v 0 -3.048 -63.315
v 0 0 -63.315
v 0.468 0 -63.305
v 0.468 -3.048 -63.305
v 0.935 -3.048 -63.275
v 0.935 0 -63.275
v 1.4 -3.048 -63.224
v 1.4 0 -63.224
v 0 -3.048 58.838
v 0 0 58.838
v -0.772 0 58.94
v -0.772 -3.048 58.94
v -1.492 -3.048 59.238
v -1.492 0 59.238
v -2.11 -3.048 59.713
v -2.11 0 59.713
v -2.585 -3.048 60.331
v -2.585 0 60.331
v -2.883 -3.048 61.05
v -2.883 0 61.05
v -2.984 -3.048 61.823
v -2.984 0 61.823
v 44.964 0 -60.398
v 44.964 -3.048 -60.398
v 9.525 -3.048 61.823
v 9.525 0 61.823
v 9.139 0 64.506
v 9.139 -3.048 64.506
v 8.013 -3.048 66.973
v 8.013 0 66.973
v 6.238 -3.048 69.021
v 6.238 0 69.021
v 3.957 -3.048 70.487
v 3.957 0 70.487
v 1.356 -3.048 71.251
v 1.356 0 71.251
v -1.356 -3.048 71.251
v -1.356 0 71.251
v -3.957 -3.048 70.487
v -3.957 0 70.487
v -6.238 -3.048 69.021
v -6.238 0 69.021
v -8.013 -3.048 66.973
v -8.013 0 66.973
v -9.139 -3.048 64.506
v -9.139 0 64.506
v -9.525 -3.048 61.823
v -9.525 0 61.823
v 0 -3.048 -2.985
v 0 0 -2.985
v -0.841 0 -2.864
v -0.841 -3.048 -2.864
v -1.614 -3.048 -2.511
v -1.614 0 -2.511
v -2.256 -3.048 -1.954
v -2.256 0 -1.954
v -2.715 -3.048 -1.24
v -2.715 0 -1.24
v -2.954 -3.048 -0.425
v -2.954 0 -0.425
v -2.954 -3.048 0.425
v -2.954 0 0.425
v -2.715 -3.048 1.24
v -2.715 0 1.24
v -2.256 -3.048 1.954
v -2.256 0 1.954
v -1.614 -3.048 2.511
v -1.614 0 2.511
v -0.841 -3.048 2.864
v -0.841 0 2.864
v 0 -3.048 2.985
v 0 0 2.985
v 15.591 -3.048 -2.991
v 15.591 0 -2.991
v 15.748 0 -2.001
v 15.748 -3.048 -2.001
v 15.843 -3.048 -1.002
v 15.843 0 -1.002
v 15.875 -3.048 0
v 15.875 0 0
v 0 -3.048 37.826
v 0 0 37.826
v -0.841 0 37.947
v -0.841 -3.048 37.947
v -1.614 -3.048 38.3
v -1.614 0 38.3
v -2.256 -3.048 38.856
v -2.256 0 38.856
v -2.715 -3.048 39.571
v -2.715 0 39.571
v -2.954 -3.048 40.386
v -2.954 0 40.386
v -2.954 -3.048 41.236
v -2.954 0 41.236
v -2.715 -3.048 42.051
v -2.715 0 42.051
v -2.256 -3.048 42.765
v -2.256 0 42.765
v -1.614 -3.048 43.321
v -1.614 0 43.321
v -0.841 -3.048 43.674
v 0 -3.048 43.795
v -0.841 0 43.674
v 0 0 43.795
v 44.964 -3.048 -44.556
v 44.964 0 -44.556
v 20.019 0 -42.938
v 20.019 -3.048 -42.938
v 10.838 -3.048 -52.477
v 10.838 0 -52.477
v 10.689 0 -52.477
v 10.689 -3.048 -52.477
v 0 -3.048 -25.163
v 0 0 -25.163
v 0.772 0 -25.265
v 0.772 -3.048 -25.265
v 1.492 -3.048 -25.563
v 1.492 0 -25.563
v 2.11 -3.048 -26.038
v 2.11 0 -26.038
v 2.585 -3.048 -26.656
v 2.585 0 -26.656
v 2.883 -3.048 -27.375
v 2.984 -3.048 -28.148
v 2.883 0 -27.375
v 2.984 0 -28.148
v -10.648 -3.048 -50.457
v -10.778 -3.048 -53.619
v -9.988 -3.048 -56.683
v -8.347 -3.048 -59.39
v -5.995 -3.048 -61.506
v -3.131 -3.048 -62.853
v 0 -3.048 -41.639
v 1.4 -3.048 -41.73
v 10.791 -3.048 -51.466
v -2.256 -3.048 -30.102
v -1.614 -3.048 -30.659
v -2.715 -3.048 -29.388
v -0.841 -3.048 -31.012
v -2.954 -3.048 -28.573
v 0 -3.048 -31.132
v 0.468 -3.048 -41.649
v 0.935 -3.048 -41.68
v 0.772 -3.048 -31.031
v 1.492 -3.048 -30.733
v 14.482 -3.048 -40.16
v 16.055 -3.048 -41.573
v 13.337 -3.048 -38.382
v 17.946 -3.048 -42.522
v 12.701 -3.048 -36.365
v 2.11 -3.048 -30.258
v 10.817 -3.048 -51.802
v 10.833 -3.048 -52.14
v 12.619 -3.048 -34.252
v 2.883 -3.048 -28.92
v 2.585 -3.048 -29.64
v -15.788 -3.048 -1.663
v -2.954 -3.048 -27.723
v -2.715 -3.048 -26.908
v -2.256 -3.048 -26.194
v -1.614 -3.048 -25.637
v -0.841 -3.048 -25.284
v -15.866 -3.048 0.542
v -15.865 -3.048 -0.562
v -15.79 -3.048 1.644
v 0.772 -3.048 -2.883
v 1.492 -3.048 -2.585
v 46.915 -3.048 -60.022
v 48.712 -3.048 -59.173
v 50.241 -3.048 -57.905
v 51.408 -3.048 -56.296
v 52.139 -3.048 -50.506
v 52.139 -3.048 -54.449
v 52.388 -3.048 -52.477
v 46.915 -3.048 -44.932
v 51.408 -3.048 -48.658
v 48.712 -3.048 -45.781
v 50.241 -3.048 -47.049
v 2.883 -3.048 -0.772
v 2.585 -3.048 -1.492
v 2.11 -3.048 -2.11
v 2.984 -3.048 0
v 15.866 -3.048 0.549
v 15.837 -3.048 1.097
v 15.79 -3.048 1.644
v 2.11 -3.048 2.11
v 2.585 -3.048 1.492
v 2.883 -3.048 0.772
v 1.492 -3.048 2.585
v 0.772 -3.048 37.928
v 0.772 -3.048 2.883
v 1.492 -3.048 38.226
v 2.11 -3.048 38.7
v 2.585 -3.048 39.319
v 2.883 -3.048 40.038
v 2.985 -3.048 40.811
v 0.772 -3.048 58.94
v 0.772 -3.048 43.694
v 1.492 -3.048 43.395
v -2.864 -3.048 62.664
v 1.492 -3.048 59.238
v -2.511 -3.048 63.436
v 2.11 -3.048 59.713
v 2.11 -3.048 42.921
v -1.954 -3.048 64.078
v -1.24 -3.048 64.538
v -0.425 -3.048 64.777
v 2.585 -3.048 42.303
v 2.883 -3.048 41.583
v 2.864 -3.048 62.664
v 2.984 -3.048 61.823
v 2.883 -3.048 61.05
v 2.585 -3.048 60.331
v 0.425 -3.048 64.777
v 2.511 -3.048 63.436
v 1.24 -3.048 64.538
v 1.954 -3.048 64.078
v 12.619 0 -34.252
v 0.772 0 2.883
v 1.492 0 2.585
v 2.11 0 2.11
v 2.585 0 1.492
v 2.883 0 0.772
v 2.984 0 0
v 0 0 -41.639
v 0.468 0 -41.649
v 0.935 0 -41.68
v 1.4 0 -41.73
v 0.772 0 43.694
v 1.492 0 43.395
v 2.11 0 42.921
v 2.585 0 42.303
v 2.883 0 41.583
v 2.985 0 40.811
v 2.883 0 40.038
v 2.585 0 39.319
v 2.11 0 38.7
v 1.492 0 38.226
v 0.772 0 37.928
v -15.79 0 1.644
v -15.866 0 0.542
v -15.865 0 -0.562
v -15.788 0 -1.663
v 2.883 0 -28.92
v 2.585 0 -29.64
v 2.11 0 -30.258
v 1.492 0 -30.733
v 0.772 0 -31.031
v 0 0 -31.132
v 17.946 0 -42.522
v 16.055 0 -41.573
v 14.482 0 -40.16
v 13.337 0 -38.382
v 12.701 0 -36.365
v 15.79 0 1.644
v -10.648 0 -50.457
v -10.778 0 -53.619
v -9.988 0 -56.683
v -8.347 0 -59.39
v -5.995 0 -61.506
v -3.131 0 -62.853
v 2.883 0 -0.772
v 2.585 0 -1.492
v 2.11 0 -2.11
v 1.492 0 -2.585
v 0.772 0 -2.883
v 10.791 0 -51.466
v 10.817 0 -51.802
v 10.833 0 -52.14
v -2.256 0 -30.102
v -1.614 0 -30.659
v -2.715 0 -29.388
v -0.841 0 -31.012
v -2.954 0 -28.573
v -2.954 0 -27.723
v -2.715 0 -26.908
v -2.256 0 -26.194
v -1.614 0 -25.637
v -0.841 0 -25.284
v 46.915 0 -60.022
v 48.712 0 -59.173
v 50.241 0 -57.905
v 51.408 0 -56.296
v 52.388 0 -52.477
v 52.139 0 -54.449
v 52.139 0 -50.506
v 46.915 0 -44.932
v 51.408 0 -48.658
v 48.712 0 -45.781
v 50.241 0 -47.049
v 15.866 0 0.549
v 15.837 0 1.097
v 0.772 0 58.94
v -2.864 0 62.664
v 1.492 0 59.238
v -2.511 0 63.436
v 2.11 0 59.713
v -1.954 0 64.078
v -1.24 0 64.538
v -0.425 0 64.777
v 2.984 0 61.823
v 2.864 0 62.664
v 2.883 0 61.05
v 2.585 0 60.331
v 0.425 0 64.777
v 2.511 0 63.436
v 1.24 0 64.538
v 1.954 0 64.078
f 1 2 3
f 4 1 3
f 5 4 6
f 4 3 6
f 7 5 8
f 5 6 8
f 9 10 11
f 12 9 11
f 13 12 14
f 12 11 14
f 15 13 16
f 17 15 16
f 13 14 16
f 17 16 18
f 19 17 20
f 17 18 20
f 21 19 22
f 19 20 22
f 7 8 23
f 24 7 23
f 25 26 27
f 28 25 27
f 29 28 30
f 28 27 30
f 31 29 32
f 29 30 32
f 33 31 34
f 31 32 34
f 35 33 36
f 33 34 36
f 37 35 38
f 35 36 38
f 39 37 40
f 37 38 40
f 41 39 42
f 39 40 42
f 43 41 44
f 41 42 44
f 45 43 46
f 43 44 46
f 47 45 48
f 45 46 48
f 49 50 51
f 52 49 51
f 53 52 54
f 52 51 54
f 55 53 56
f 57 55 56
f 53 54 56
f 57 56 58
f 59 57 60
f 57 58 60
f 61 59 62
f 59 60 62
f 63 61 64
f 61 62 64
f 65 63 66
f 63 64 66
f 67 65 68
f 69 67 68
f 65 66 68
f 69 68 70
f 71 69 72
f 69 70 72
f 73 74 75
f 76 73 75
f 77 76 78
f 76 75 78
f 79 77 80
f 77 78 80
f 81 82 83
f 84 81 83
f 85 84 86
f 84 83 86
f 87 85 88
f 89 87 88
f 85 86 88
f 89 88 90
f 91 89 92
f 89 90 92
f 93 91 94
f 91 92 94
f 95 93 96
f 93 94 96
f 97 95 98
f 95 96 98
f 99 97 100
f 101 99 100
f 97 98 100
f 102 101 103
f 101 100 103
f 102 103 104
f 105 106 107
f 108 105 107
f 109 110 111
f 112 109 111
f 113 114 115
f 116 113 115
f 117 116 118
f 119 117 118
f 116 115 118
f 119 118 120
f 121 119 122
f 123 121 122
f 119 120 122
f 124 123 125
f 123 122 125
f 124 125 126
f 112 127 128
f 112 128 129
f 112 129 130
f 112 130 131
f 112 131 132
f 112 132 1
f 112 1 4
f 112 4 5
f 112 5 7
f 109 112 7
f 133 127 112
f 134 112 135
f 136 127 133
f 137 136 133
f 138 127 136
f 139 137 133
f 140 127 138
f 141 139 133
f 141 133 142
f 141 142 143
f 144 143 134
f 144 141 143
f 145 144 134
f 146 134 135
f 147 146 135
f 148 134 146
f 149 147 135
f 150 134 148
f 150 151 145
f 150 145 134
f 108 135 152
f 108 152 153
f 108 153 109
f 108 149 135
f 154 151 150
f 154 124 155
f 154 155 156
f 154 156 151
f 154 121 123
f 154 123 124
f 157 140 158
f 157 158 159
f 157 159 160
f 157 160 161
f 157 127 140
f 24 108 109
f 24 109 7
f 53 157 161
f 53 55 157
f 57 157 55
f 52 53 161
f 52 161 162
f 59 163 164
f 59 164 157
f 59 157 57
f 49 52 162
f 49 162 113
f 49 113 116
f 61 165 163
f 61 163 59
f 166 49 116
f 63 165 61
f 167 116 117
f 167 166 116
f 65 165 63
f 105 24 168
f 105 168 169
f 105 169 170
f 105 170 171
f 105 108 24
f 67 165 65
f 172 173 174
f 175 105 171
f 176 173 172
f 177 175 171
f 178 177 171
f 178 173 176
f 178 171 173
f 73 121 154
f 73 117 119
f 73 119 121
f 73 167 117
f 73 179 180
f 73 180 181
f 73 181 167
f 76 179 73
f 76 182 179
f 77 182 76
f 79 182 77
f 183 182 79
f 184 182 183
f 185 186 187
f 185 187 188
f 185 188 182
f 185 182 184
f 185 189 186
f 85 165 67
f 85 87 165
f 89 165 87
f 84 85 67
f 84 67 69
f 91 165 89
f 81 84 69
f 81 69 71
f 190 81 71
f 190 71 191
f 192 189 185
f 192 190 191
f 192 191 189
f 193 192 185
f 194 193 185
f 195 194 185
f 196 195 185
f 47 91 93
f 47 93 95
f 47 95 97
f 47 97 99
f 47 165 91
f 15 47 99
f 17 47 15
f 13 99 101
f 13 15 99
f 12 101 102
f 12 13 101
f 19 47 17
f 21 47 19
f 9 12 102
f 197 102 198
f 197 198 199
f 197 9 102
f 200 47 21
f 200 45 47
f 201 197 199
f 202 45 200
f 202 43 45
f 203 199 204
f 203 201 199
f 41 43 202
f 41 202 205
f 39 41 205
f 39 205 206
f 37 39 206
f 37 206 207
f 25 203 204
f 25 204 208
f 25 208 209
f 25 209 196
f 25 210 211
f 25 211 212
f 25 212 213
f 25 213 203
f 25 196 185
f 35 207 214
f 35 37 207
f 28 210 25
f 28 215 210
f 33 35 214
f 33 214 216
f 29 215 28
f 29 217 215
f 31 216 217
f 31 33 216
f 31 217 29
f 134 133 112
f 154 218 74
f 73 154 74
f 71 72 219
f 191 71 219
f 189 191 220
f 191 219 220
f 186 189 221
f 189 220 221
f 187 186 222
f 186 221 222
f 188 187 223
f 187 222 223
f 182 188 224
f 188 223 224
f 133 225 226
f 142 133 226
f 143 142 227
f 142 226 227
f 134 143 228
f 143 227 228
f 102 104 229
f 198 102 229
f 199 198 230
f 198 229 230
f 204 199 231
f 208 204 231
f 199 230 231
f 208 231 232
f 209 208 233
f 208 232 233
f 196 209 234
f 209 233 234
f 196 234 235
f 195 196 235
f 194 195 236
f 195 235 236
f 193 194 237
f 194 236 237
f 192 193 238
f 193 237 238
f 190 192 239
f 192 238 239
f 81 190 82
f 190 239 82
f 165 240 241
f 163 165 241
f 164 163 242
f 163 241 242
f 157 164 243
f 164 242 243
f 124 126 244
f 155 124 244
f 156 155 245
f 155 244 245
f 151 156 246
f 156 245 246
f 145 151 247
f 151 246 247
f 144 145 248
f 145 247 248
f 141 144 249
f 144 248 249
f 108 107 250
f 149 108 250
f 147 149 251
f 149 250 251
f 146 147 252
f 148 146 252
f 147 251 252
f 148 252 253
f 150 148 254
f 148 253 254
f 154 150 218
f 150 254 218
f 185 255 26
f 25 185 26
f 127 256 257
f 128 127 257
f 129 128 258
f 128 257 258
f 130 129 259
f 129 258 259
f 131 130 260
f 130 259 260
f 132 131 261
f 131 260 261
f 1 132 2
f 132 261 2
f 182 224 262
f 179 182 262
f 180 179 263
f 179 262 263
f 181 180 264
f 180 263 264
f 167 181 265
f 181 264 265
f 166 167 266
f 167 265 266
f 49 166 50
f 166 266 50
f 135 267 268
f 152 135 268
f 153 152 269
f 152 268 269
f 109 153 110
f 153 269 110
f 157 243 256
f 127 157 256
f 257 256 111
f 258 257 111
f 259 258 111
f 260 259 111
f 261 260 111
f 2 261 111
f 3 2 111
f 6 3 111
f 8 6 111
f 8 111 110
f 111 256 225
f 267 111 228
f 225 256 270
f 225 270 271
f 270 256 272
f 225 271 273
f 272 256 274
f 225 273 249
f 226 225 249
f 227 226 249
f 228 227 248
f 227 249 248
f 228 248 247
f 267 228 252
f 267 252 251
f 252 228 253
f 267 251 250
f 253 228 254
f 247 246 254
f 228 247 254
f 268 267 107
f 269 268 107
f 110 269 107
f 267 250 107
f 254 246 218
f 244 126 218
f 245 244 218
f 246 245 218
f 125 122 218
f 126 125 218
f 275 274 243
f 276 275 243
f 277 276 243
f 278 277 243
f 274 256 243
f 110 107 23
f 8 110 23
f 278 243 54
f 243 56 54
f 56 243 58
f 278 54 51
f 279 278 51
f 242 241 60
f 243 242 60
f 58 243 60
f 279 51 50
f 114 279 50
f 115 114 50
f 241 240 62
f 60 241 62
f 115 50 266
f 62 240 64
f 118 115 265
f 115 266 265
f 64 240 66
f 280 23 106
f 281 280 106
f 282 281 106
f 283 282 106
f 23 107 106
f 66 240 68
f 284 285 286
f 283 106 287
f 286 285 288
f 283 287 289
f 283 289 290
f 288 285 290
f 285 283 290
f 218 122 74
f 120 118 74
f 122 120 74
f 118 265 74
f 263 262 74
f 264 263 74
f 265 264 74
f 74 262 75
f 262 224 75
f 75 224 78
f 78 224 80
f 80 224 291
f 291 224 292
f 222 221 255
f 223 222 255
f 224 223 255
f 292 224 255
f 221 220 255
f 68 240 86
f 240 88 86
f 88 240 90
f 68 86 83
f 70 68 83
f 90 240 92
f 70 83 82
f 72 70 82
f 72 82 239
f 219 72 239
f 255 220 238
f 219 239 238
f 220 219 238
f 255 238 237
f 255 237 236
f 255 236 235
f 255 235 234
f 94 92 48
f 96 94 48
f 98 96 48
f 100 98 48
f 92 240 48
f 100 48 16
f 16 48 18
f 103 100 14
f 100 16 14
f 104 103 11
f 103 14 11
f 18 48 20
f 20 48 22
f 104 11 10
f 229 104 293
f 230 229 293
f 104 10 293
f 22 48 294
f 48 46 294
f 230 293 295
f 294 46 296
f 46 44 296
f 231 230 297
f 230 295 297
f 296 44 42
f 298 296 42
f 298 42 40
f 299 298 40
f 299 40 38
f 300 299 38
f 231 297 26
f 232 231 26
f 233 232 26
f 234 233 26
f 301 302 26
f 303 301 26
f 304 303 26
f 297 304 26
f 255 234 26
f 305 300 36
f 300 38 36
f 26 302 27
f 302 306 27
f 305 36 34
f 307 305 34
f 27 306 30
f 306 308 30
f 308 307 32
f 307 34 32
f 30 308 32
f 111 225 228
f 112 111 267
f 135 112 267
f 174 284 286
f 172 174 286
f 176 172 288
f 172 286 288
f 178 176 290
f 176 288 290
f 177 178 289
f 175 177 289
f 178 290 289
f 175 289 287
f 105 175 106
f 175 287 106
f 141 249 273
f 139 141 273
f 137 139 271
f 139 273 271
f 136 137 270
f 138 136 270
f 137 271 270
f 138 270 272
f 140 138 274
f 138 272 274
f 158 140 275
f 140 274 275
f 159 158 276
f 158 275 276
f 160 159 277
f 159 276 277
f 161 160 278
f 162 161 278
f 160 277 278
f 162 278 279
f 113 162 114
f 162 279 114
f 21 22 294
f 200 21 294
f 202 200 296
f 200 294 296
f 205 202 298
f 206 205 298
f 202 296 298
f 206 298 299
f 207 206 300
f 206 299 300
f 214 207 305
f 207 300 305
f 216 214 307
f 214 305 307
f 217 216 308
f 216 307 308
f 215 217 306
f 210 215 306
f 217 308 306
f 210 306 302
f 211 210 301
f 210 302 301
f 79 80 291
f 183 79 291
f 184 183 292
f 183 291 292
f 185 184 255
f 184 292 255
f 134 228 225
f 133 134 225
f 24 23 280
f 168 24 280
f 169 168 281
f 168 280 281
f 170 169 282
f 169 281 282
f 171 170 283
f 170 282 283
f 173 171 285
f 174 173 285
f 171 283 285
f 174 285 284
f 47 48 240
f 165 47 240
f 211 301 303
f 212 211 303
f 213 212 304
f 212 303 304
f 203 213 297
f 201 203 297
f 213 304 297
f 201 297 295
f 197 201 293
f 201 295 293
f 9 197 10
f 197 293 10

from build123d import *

# Parameters (mm, degrees)
F1_DEPTH = 3.048


with BuildPart() as f1:
    # F0 (on Front) → F1 (new body)
    with BuildSketch(Plane.XZ):
        with BuildLine():
            Line((15.875, 0), (15.5906901587, -2.9909873578))
            ThreePointArc((15.5906901587, -2.9909873578), (15.803762705, -1.5022347903), (15.875, 0))
        make_face()
        with BuildLine():
            Line((1.4003408265, -63.2241331384), (0, -63.3149812557))
            ThreePointArc((0, -63.3149812557), (0.7016423253, -63.2922453786), (1.4003408265, -63.2241331384))
        make_face()
        with BuildLine():
            ThreePointArc((36.5125, -52.4770691991), (39.0220603724, -58.2685610319), (44.9638707463, -60.3979178346))
            ThreePointArc((44.9638707463, -60.3979178346), (50.2414918328, -57.9050088266), (52.3875, -52.4770691991))
            ThreePointArc((52.3875, -52.4770691991), (50.2414918328, -47.0491295715), (44.9638707463, -44.5562205636))
            ThreePointArc((44.9638707463, -44.5562205636), (39.0220603724, -46.6855773663), (36.5125, -52.4770691991))
        make_face()
        with BuildLine():
            Line((12.6191526396, -34.2520619409), (11.8439294246, -42.4075405738))
            Line((11.8439294246, -42.4075405738), (20.0189840628, -42.9379031172))
            ThreePointArc((20.0189840628, -42.9379031172), (14.4819098788, -40.1601346792), (12.6191526396, -34.2520619409))
        make_face()
        with BuildLine():
            ThreePointArc((9.525, 61.8229308009), (0, 71.3479308009), (-9.525, 61.8229308009))
            Line((-9.525, 61.8229308009), (-2.9845, 61.8229308009))
            ThreePointArc((-2.9845, 61.8229308009), (0, 64.8074308009), (2.9845, 61.8229308009))
            ThreePointArc((2.9845, 61.8229308009), (2.1103601885, 59.7125706125), (0, 58.8384308009))
            Line((0, 58.8384308009), (0, 52.2979308009))
            ThreePointArc((0, 52.2979308009), (6.7351920908, 55.0877387101), (9.525, 61.8229308009))
        make_face()
        with BuildLine():
            Line((-2.9845, 61.8229308009), (-9.525, 61.8229308009))
            ThreePointArc((-9.525, 61.8229308009), (-6.7351920908, 55.0877387101), (0, 52.2979308009))
            Line((0, 52.2979308009), (0, 58.8384308009))
            ThreePointArc((0, 58.8384308009), (-2.1103601885, 59.7125706125), (-2.9845, 61.8229308009))
        make_face()
        with BuildLine():
            Line((0, 37.8262675612), (0, 15.875))
            ThreePointArc((0, 15.875), (10.6283048728, 11.7921482577), (15.7896751859, 1.6437099882))
            Line((15.7896751859, 1.6437099882), (9.525, 61.8229308009))
            ThreePointArc((9.525, 61.8229308009), (6.7351920908, 55.0877387101), (0, 52.2979308009))
            Line((0, 52.2979308009), (0, 43.7952675612))
            ThreePointArc((0, 43.7952675612), (2.1103601885, 42.9211277496), (2.9845, 40.8107675612))
            ThreePointArc((2.9845, 40.8107675612), (2.1103601885, 38.7004073727), (0, 37.8262675612))
        make_face()
        with BuildLine():
            Line((-9.525, 61.8229308009), (-15.7896751859, 1.6437099882))
            ThreePointArc((-15.7896751859, 1.6437099882), (-10.6283048728, 11.7921482577), (0, 15.875))
            Line((0, 15.875), (0, 37.8262675612))
            ThreePointArc((0, 37.8262675612), (-2.9845, 40.8107675612), (0, 43.7952675612))
            Line((0, 43.7952675612), (0, 52.2979308009))
            ThreePointArc((0, 52.2979308009), (-6.7351920908, 55.0877387101), (-9.525, 61.8229308009))
        make_face()
        with BuildLine():
            ThreePointArc((-15.7896751859, 1.6437099882), (-15.8749970359, -0.0097010433), (-15.7876544862, -1.6630065613))
            ThreePointArc((-15.7876544862, -1.6630065613), (-10.6210968322, -11.7986408997), (0, -15.875))
            Line((0, -15.875), (0, -2.9845))
            ThreePointArc((0, -2.9845), (-2.9845, 0), (0, 2.9845))
            Line((0, 2.9845), (0, 11.0229308009))
            Line((0, 11.0229308009), (0, 15.875))
            ThreePointArc((0, 15.875), (-10.6283048728, 11.7921482577), (-15.7896751859, 1.6437099882))
        make_face()
        with BuildLine():
            Line((0, -31.1324340047), (0, -41.6391571425))
            ThreePointArc((0, -41.6391571425), (0.7016423253, -41.6618930196), (1.4003408265, -41.7300052598))
            Line((1.4003408265, -41.7300052598), (11.8439294246, -42.4075405738))
            Line((11.8439294246, -42.4075405738), (12.6191526396, -34.2520619409))
            Line((12.6191526396, -34.2520619409), (15.5906901587, -2.9909873578))
            ThreePointArc((15.5906901587, -2.9909873578), (10.1127073698, -12.2371881841), (0, -15.875))
            Line((0, -15.875), (0, -25.1634340047))
            ThreePointArc((0, -25.1634340047), (2.1103601885, -26.0375738162), (2.9845, -28.1479340047))
            ThreePointArc((2.9845, -28.1479340047), (2.1103601885, -30.2582941931), (0, -31.1324340047))
        make_face()
        with BuildLine():
            Line((10.8867652033, -52.4770691991), (10.8379120566, -52.4770691991))
            ThreePointArc((10.8379120566, -52.4770691991), (8.1436204624, -59.6284175691), (1.4003408265, -63.2241331384))
            Line((1.4003408265, -63.2241331384), (44.9638707463, -60.3979178346))
            ThreePointArc((44.9638707463, -60.3979178346), (39.0220603724, -58.2685610319), (36.5125, -52.4770691991))
            Line((36.5125, -52.4770691991), (10.8867652033, -52.4770691991))
        make_face()
        with BuildLine():
            Line((0, -2.9845), (0, -15.875))
            ThreePointArc((0, -15.875), (10.1127073698, -12.2371881841), (15.5906901587, -2.9909873578))
            Line((15.5906901587, -2.9909873578), (15.875, 0))
            ThreePointArc((15.875, 0), (15.8536544458, 0.8229615497), (15.7896751859, 1.6437099882))
            ThreePointArc((15.7896751859, 1.6437099882), (10.6283048728, 11.7921482577), (0, 15.875))
            Line((0, 15.875), (0, 11.0229308009))
            Line((0, 11.0229308009), (0, 2.9845))
            ThreePointArc((0, 2.9845), (2.1103601885, 2.1103601885), (2.9845, 0))
            ThreePointArc((2.9845, 0), (2.1103601885, -2.1103601885), (0, -2.9845))
        make_face()
        with BuildLine():
            Line((0, -52.4770691991), (0, -41.6391571425))
            ThreePointArc((0, -41.6391571425), (-6.9124383958, -44.1297023585), (-10.6479290016, -50.4566866308))
            ThreePointArc((-10.6479290016, -50.4566866308), (-8.3473668405, -59.3895075949), (0, -63.3149812557))
            Line((0, -63.3149812557), (1.4003408265, -63.2241331384))
            ThreePointArc((1.4003408265, -63.2241331384), (8.1436204624, -59.6284175691), (10.8379120566, -52.4770691991))
            Line((10.8379120566, -52.4770691991), (10.6890844764, -52.4770691991))
            Line((10.6890844764, -52.4770691991), (0, -52.4770691991))
        make_face()
        with BuildLine():
            Line((20.0189840628, -42.9379031172), (11.8439294246, -42.4075405738))
            Line((11.8439294246, -42.4075405738), (10.8867652033, -52.4770691991))
            Line((10.8867652033, -52.4770691991), (36.5125, -52.4770691991))
            ThreePointArc((36.5125, -52.4770691991), (39.0220603724, -46.6855773663), (44.9638707463, -44.5562205636))
            Line((44.9638707463, -44.5562205636), (20.0189840628, -42.9379031172))
        make_face()
        with BuildLine():
            Line((11.8439294246, -42.4075405738), (1.4003408265, -41.7300052598))
            ThreePointArc((1.4003408265, -41.7300052598), (7.800803165, -44.9532531642), (10.7906490607, -51.4660149992))
            ThreePointArc((10.7906490607, -51.4660149992), (10.8260898597, -51.9709900586), (10.8379120566, -52.4770691991))
            Line((10.8379120566, -52.4770691991), (10.8867652033, -52.4770691991))
            Line((10.8867652033, -52.4770691991), (11.8439294246, -42.4075405738))
        make_face()
        with BuildLine():
            Line((1.4003408265, -41.7300052598), (0, -41.6391571425))
            Line((0, -41.6391571425), (0, -52.4770691991))
            Line((0, -52.4770691991), (10.6890844764, -52.4770691991))
            Line((10.6890844764, -52.4770691991), (10.7906490607, -51.4660149992))
            ThreePointArc((10.7906490607, -51.4660149992), (7.800803165, -44.9532531642), (1.4003408265, -41.7300052598))
        make_face()
        with BuildLine():
            ThreePointArc((-10.6479290016, -50.4566866308), (-6.9124383958, -44.1297023585), (0, -41.6391571425))
            Line((0, -41.6391571425), (0, -31.1324340047))
            ThreePointArc((0, -31.1324340047), (-2.9845, -28.1479340047), (0, -25.1634340047))
            Line((0, -25.1634340047), (0, -15.875))
            ThreePointArc((0, -15.875), (-10.6210968322, -11.7986408997), (-15.7876544862, -1.6630065613))
            Line((-15.7876544862, -1.6630065613), (-10.6479290016, -50.4566866308))
        make_face()
    extrude(amount=F1_DEPTH)


solid = f1.part
